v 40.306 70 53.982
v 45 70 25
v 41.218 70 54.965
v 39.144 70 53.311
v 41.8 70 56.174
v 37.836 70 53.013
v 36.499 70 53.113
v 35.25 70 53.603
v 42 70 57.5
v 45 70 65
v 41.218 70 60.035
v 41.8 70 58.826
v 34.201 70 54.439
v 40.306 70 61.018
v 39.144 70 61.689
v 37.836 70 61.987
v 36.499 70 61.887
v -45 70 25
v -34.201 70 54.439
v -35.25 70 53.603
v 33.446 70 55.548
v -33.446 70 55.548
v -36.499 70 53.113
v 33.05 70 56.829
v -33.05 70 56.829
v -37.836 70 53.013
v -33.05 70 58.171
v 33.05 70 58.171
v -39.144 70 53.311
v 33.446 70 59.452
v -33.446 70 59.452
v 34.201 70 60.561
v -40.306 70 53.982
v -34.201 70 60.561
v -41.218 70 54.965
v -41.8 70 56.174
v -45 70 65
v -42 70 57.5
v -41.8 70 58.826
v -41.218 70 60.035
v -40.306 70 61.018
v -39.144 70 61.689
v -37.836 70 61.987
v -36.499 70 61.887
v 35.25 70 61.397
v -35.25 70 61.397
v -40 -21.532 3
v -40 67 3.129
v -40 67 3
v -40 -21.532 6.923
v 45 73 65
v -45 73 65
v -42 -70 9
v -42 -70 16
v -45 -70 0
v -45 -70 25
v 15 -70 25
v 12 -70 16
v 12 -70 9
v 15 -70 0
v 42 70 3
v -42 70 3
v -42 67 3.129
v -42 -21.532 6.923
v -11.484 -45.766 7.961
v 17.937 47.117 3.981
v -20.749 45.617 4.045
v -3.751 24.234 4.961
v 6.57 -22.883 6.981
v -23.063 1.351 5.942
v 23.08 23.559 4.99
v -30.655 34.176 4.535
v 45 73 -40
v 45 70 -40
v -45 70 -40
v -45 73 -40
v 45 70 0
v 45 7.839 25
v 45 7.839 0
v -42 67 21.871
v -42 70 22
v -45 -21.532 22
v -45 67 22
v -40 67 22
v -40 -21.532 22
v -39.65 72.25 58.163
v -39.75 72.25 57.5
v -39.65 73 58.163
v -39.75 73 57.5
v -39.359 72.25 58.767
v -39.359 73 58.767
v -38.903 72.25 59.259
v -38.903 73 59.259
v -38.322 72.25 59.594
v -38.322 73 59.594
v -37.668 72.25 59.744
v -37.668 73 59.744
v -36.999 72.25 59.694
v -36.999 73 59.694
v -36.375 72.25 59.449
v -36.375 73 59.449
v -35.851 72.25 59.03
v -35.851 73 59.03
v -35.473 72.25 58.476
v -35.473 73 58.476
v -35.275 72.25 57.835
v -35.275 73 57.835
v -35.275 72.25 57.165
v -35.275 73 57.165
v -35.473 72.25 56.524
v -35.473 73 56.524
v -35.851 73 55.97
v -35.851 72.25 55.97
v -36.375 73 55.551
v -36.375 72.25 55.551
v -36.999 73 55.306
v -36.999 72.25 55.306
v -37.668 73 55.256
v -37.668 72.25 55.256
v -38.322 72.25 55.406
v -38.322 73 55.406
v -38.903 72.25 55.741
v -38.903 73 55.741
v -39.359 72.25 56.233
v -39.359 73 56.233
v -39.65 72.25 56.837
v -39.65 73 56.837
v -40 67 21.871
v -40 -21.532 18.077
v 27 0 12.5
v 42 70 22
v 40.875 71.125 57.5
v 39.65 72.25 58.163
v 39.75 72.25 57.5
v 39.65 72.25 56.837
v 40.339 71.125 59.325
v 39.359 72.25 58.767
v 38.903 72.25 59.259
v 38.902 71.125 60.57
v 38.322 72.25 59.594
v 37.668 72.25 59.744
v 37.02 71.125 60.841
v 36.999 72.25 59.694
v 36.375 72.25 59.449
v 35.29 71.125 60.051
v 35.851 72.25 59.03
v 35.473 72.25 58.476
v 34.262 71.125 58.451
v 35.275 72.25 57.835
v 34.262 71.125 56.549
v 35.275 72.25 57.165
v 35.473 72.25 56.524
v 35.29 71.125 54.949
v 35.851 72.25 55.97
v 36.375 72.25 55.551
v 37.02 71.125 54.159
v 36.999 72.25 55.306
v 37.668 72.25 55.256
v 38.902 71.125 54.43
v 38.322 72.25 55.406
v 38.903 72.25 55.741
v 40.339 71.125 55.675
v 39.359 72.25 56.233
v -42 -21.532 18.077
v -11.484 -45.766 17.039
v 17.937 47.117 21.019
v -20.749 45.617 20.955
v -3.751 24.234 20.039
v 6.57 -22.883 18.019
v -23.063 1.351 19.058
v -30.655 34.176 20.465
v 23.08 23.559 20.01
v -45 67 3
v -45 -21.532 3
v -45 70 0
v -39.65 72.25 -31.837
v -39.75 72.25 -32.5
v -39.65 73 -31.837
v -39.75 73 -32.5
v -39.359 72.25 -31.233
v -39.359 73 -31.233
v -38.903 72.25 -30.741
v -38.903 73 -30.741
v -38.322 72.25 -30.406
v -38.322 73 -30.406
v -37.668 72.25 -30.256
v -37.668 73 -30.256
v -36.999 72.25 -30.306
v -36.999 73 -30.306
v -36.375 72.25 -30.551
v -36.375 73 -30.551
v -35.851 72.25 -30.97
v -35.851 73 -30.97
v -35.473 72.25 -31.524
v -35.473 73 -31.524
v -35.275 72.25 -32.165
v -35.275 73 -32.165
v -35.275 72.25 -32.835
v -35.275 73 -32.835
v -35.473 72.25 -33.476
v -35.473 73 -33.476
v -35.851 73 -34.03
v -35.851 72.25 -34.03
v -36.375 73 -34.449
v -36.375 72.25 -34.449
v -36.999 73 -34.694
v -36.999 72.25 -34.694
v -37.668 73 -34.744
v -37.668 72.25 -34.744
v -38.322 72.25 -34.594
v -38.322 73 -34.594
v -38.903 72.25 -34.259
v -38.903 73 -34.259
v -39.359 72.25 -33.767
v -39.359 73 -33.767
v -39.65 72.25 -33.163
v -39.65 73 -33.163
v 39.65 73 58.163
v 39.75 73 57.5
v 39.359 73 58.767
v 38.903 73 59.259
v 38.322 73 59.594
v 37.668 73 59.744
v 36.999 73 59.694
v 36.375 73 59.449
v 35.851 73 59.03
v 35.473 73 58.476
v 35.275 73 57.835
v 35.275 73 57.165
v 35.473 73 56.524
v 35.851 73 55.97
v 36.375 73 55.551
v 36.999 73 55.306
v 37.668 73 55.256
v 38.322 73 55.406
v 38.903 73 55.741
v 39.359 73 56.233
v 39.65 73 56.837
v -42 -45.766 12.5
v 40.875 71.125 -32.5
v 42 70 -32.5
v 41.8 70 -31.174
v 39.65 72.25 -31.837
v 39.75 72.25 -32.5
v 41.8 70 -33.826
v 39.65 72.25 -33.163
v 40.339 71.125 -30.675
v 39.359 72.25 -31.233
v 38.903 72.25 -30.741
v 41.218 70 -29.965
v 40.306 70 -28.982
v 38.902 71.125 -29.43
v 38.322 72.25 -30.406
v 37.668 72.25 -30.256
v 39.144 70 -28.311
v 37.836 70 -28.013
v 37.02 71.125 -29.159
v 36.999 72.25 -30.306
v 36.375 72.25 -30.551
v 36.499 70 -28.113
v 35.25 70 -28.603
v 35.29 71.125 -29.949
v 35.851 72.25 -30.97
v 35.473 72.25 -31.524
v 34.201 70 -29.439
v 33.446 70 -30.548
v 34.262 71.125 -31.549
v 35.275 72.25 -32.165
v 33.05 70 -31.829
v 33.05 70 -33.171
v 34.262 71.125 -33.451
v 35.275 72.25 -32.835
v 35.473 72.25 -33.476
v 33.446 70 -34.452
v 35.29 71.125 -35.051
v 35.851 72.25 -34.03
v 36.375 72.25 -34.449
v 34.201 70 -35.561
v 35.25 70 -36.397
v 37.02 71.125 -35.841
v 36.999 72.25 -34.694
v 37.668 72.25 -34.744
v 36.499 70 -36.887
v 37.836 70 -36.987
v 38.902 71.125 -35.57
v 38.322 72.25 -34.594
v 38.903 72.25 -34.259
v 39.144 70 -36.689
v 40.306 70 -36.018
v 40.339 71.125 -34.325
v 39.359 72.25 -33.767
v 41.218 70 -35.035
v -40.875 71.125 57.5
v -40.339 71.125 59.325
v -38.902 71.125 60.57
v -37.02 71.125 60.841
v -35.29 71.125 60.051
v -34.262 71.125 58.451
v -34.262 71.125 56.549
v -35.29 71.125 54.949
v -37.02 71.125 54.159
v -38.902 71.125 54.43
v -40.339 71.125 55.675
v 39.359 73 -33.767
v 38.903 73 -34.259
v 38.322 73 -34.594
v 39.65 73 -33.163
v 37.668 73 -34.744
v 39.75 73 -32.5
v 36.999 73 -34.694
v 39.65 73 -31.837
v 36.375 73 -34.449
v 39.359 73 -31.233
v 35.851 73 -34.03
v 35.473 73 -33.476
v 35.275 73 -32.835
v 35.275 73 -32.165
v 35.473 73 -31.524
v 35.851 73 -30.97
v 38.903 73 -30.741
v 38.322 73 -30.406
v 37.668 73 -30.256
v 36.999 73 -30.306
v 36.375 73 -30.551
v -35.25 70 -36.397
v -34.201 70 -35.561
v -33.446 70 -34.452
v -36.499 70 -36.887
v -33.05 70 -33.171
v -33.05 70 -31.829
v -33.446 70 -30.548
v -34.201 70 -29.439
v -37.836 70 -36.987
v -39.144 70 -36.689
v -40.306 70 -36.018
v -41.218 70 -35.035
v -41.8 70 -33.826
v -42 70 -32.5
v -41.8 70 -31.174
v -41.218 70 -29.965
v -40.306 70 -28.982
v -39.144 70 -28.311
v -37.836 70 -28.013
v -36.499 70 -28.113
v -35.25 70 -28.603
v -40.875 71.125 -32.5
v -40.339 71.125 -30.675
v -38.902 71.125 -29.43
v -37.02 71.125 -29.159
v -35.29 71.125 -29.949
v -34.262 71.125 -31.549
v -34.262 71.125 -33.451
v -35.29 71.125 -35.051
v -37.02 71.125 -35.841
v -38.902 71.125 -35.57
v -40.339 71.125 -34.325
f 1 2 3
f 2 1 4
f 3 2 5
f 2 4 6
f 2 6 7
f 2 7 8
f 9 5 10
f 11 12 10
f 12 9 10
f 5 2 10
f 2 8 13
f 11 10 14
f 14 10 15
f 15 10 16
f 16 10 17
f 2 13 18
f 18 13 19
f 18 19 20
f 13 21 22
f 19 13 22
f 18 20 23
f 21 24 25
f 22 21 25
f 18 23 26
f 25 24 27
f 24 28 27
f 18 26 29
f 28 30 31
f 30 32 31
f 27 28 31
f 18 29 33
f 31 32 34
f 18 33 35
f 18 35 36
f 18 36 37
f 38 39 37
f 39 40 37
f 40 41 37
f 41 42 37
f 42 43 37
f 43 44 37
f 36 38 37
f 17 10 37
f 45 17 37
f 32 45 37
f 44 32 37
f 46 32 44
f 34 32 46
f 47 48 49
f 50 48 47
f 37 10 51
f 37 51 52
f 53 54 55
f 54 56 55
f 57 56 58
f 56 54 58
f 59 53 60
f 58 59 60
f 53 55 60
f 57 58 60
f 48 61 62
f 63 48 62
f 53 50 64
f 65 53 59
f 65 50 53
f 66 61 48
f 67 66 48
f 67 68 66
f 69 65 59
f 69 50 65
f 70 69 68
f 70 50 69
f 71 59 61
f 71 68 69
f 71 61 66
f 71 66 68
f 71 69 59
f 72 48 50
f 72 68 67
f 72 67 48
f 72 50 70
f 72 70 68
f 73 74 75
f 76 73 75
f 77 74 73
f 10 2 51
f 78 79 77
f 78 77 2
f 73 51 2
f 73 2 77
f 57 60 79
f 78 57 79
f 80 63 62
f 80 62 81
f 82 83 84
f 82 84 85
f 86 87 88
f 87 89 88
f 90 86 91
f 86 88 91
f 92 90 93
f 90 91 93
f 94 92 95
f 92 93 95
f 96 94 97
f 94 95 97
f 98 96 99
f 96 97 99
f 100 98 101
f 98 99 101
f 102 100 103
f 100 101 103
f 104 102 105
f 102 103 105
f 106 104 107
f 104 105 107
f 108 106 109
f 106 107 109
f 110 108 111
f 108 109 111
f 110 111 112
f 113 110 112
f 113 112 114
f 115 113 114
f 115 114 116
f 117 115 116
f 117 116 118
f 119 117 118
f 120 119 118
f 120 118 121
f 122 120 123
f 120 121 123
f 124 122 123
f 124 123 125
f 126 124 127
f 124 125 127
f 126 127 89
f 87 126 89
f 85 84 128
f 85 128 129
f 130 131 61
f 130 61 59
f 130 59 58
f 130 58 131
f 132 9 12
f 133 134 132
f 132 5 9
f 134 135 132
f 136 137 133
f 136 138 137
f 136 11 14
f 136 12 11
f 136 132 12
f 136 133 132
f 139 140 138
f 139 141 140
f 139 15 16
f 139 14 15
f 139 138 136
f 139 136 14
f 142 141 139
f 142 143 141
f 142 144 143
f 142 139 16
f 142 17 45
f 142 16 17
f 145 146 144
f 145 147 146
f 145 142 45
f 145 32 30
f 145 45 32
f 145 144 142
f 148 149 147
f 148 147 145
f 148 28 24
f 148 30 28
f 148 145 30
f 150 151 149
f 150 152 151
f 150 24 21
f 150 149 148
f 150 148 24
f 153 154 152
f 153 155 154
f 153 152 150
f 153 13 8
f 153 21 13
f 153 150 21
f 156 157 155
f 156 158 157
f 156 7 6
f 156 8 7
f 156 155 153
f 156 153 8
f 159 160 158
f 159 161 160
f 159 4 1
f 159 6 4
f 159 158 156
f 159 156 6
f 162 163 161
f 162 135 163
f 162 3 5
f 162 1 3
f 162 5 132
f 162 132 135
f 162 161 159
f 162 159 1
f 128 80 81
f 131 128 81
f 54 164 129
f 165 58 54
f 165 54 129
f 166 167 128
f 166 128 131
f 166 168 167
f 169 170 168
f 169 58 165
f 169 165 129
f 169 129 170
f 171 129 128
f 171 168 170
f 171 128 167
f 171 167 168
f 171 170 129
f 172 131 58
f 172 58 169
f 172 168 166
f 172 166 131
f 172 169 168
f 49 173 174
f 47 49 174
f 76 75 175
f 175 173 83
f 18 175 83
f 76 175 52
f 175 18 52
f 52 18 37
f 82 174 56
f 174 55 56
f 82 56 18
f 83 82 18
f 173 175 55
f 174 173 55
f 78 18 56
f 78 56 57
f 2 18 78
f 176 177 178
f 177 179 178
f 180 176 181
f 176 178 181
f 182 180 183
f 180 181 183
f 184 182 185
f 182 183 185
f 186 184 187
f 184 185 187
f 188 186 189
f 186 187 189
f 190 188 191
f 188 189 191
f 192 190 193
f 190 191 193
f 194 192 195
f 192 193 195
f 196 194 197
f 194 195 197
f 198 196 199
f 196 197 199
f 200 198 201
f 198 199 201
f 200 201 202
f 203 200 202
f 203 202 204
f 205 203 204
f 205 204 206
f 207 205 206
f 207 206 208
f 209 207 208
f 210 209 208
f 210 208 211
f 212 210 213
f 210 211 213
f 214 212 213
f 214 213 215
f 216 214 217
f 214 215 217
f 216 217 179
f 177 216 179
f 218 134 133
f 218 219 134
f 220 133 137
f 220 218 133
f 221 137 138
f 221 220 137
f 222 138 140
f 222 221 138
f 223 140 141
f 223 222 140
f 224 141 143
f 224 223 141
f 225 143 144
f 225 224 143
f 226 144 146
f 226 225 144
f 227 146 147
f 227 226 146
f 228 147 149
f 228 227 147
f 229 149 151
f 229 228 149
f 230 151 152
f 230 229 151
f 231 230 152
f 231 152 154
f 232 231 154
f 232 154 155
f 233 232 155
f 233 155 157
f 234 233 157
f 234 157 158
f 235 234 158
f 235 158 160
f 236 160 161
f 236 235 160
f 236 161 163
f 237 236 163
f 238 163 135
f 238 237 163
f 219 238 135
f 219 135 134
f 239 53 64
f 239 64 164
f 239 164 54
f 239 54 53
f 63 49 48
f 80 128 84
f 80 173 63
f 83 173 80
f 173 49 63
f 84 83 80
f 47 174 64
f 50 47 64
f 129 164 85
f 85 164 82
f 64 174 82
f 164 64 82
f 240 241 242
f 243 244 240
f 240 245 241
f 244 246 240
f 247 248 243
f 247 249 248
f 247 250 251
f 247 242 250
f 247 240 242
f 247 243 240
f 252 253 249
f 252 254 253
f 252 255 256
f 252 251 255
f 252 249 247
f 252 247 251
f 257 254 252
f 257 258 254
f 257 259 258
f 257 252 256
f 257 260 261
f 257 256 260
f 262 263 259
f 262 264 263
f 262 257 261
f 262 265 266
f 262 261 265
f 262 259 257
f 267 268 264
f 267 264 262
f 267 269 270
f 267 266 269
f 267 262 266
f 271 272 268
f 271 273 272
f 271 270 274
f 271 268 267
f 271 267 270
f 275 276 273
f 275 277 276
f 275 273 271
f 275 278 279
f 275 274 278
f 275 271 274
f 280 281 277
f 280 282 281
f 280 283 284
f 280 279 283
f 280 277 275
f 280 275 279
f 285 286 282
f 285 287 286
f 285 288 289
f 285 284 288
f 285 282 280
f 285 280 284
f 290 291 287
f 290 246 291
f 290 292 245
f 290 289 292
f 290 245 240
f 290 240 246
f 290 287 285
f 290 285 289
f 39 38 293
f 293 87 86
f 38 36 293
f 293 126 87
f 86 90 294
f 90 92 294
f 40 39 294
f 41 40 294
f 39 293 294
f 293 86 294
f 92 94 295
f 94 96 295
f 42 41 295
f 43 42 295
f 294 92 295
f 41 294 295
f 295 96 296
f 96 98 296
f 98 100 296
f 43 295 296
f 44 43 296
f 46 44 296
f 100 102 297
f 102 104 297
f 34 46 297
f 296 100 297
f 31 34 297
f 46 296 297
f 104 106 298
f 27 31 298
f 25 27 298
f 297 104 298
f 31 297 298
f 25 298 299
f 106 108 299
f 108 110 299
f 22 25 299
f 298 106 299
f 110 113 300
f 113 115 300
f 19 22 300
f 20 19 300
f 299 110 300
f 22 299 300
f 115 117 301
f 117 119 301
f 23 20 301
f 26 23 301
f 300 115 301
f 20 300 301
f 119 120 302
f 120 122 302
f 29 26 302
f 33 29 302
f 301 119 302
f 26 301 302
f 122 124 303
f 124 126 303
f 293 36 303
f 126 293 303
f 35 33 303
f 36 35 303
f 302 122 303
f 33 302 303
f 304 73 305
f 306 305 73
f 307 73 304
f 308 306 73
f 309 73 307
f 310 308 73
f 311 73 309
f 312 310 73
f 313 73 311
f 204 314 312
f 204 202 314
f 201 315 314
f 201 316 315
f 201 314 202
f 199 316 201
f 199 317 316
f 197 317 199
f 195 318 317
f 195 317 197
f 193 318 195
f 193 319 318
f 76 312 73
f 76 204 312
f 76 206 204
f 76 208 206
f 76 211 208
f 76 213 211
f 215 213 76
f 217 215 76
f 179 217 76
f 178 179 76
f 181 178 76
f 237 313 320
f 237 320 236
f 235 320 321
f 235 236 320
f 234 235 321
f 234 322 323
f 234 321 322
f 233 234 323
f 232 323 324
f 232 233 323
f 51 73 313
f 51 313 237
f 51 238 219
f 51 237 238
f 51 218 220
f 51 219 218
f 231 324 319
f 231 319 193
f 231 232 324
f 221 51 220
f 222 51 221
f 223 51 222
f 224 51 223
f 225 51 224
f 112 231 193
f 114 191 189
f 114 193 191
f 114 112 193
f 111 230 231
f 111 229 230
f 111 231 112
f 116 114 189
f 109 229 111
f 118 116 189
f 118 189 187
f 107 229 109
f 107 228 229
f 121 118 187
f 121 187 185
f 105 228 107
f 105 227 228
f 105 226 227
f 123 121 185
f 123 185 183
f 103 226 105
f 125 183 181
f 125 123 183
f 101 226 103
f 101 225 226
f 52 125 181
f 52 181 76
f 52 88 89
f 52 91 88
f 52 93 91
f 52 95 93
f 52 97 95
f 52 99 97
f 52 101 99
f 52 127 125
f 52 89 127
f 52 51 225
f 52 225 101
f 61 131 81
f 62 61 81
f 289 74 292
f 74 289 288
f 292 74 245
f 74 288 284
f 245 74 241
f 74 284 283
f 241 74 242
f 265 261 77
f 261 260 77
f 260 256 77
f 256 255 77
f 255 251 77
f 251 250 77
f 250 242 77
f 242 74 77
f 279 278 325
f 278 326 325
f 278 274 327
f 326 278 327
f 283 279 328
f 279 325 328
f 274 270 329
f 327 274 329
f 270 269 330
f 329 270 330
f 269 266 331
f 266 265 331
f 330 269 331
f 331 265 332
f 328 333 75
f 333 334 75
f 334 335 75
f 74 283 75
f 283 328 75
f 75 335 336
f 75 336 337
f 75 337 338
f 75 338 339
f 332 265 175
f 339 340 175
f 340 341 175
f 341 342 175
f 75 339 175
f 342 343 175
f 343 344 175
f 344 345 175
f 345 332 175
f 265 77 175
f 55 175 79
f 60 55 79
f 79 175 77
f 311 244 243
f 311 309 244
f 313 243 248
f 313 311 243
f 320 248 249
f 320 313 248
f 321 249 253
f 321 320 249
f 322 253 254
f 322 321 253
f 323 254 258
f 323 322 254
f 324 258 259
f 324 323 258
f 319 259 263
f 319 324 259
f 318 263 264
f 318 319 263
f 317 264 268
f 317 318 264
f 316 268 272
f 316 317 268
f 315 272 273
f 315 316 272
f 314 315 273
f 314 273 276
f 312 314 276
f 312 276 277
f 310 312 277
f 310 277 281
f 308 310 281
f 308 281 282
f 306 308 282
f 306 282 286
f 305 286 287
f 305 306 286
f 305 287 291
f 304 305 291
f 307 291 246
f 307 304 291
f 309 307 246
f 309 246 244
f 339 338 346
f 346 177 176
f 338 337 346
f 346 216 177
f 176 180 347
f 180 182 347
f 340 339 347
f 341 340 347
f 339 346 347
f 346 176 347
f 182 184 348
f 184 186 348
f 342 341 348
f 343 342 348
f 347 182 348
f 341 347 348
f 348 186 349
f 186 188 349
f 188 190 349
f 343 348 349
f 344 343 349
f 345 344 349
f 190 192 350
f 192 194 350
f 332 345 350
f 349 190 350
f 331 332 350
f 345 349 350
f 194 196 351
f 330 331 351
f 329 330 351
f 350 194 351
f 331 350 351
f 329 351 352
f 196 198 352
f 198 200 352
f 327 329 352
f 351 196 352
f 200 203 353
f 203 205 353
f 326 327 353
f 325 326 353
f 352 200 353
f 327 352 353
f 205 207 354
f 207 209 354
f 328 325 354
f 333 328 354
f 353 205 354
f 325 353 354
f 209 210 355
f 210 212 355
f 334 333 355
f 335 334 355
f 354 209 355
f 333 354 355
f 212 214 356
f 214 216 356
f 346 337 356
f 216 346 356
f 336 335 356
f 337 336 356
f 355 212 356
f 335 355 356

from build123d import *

# Parameters (mm, degrees)
PAD_DEPTH        = 25
SKETCH001_W      = 84
SKETCH001_H      = 19
SKETCH002_W      = 54
SKETCH002_H      = 7
SKETCH003_W      = 88.531874
SKETCH003_H      = 19
POCKET_DEPTH     = 5
SKETCH004_W      = 90
SKETCH004_H      = 105
PAD001_DEPTH     = 3
HOLE_D           = 4.5
HOLE_DEPTH       = 25
HOLE_CSINK_D     = 9
HOLE_CSINK_ANGLE = 90


with BuildPart() as part:
    # Sketch → Pad (new body)
    with BuildSketch(Plane.XY):
        Polygon((-45, 70), (-45, -21.531874), (-45, -70), (15, -70), (45, 7.838913), (45, 70), align=None)
    extrude(amount=PAD_DEPTH)

    # Sketch001 (on Face6 of Pad) → SubtractiveLoft section 0
    with BuildSketch(Plane(origin=(0, 70, 0), x_dir=(-1, 0, 0), z_dir=(0, 1, 0))):
        with Locations((0, 12.5)):
            Rectangle(SKETCH001_W, SKETCH001_H)
    # Sketch002 (on Face3 of Pad) → SubtractiveLoft section 1
    with BuildSketch(Plane.XZ.offset(70)):
        with Locations((-15, 12.5)):
            Rectangle(SKETCH002_W, SKETCH002_H)
    loft(mode=Mode.SUBTRACT)

    # Sketch003 (on Face1 of SubtractiveLoft) → Pocket (cut)
    with BuildSketch(Plane(origin=(-45, 0, 0), x_dir=(0, -1, 0), z_dir=(-1, 0, 0))):
        with Locations((-22.734063, 12.5)):
            Rectangle(SKETCH003_W, SKETCH003_H)
    extrude(amount=-POCKET_DEPTH, mode=Mode.SUBTRACT)

    # Sketch004 (on Face8 of Pocket) → Pad001 (join)
    with BuildSketch(Plane(origin=(0, 70, 0), x_dir=(-1, 0, 0), z_dir=(0, 1, 0))):
        with Locations((0, 12.5)):
            Rectangle(SKETCH004_W, SKETCH004_H)
    extrude(amount=PAD001_DEPTH)

    # Hole
    with Locations(Plane.XZ.offset(-70)):
        with Locations((-37.5, 57.5), (-37.5, -32.5)):
            hole = CounterSinkHole(HOLE_D / 2, HOLE_CSINK_D / 2, depth=HOLE_DEPTH, counter_sink_angle=HOLE_CSINK_ANGLE)

    # Mirrored: Hole across Sketch005 V_Axis
    add(hole.mirror(Plane(origin=(0, 70, 0), x_dir=(0, -1, 0), z_dir=(1, 0, 0))), mode=Mode.SUBTRACT)


solid = part.part
